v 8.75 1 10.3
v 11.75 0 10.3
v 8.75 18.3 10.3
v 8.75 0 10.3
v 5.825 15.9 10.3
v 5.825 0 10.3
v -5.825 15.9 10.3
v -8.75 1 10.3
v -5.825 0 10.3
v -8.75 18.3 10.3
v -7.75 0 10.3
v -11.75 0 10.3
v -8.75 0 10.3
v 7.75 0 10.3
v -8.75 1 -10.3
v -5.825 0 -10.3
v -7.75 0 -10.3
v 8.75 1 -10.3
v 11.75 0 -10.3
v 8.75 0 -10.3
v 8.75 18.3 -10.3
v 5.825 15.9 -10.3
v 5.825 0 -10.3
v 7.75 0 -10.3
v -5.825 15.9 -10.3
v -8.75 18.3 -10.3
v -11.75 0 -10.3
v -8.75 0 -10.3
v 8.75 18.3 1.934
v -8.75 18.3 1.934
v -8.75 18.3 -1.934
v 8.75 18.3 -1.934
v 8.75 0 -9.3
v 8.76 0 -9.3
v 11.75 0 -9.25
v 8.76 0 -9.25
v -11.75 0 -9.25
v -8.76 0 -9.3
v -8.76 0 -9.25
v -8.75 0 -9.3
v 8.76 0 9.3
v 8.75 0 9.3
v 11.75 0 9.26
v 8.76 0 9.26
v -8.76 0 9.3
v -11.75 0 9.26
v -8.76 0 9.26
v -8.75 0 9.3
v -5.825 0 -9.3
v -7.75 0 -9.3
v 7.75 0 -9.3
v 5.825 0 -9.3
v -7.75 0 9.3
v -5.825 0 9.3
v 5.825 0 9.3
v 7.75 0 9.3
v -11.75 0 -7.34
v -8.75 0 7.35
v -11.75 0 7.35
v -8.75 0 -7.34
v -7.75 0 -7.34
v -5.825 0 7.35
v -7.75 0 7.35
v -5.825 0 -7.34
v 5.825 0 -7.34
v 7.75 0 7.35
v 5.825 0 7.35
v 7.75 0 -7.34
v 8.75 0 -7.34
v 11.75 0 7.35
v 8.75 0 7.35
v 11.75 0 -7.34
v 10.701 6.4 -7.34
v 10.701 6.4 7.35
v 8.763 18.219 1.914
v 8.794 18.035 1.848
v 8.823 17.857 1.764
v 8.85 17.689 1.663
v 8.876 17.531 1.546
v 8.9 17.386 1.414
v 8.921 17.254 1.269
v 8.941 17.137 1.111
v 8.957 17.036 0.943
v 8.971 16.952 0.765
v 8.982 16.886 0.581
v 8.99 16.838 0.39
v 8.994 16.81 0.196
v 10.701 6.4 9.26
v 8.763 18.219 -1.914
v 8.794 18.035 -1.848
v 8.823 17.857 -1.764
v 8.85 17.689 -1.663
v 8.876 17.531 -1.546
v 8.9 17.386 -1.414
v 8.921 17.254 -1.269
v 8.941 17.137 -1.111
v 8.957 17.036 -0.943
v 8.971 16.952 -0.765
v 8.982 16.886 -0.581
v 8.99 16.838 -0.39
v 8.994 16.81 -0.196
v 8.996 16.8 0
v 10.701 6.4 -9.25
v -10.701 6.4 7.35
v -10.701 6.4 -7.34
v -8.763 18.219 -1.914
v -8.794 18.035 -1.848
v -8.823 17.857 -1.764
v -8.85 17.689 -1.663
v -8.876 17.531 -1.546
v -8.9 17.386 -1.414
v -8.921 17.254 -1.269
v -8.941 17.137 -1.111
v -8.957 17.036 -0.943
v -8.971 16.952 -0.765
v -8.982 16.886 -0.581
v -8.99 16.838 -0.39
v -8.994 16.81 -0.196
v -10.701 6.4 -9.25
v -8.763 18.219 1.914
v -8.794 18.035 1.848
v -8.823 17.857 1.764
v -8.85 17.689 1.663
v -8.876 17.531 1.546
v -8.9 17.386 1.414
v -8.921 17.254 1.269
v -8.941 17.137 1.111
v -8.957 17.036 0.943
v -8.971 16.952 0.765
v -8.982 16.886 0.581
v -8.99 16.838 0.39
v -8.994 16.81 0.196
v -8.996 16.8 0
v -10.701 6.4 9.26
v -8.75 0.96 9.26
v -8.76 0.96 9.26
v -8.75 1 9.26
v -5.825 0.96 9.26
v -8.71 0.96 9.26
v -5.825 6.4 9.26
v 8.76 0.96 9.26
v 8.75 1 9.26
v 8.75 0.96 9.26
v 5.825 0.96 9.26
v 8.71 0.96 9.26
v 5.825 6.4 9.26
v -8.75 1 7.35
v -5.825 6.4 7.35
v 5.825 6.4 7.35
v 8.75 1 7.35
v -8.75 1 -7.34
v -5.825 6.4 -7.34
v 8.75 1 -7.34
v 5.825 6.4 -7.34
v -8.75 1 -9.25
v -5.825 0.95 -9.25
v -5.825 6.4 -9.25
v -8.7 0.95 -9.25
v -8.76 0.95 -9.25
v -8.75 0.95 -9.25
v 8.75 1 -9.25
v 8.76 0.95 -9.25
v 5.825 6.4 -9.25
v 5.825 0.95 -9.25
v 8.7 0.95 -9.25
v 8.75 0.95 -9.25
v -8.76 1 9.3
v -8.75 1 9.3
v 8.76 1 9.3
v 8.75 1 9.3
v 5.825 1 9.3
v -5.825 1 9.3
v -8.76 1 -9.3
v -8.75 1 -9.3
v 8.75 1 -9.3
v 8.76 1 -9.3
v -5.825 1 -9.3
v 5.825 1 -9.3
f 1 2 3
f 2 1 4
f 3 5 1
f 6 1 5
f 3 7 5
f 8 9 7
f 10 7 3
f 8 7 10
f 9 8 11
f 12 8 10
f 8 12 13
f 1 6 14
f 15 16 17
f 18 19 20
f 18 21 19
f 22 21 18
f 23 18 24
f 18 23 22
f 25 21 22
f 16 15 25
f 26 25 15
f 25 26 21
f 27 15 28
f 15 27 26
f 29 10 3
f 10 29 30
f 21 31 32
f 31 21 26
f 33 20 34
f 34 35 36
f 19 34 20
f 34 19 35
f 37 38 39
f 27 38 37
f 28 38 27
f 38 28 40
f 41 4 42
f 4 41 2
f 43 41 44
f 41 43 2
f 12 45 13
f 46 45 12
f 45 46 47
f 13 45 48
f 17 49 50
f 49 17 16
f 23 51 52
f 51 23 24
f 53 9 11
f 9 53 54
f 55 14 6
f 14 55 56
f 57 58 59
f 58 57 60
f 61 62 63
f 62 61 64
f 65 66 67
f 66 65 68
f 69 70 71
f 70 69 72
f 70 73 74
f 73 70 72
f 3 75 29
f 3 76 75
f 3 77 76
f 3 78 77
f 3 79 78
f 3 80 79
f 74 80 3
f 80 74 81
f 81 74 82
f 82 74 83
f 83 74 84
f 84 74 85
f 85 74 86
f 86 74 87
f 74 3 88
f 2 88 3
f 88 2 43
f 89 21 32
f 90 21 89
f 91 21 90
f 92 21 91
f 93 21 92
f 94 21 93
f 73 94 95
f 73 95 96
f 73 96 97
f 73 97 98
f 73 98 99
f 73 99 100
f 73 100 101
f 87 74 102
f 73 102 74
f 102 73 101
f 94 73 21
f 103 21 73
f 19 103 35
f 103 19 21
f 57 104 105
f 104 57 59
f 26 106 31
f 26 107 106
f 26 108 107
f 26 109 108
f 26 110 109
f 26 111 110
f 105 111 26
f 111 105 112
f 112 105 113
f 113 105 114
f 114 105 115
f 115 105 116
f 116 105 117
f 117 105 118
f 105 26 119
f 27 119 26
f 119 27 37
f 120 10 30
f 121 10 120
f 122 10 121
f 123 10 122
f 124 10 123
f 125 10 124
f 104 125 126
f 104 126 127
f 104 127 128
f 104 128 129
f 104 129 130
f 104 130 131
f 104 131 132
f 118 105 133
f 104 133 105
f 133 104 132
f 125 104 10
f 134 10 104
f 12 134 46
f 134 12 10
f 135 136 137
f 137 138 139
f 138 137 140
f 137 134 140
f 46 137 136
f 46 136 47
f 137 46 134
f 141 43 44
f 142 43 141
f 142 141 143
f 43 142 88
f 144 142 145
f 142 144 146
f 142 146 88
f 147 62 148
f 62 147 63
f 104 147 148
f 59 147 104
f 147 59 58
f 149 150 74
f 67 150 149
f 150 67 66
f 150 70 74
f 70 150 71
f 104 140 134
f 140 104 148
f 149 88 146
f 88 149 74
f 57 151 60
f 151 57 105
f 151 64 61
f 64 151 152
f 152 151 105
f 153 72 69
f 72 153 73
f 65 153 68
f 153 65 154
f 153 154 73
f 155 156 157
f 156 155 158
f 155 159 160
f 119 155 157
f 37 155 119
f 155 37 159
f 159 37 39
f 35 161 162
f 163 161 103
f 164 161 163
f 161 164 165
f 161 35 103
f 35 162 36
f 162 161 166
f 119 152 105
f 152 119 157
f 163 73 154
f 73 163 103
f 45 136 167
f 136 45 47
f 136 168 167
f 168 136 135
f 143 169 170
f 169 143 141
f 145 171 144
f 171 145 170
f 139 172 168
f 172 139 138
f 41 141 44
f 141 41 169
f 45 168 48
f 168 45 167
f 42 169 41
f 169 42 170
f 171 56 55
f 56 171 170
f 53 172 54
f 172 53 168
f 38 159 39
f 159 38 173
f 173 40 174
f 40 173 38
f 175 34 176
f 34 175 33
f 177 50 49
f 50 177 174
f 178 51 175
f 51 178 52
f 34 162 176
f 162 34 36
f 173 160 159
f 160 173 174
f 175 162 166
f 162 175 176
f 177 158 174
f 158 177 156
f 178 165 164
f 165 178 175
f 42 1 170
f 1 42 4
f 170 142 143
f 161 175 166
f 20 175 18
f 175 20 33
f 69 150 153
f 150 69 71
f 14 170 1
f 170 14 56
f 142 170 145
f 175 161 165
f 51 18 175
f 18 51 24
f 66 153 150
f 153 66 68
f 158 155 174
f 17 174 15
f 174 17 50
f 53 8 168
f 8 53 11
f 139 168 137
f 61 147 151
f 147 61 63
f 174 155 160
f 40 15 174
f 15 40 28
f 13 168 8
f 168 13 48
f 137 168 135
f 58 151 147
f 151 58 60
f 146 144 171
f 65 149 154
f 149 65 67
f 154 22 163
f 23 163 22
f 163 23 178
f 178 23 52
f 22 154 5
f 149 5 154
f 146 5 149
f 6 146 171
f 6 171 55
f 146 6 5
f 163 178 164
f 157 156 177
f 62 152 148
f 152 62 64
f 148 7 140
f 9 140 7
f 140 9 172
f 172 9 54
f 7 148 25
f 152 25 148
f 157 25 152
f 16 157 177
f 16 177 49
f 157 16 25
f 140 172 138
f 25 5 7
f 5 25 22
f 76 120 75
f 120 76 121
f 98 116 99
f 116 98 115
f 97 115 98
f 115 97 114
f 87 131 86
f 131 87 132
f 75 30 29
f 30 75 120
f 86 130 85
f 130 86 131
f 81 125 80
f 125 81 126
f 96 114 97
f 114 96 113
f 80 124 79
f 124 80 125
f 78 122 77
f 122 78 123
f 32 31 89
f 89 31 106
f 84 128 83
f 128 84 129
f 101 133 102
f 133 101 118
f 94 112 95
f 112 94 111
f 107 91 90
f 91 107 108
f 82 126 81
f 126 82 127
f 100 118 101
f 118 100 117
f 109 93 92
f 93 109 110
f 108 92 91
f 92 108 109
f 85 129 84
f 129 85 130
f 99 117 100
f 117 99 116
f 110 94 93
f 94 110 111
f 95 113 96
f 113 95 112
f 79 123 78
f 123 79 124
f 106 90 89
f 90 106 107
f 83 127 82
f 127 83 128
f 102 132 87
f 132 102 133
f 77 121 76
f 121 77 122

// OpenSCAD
/*
  models/ham_radio/spooltenna_bnc_cap/spooltenna_bnc_cap.scad

  Parameterized BNC protective cap for the KO4HUI Spooltenna
  (Ultra v1.5/v1.6 primary, v1.3 stretch). Drops into the existing
  PCB slot at the bottom of the spool; held in place by the bongo tie.

  See docs/superpowers/specs/2026-05-12-spooltenna-bnc-cap-design.md
*/

$fn = 64;

// ---------------------------------------------------------------
// Model preset
// ---------------------------------------------------------------
//   "ULTRA_V1_6"  - Spooltenna Ultra v1.6 (default, identical to v1.5)
//   "ULTRA_V1_5"  - alias for ULTRA_V1_6
//   "V1_3"        - Spooltenna v1.3 (larger 120 mm disk)
model = "ULTRA_V1_6";

// ---------------------------------------------------------------
// Per-model geometry. Edit `model` above to switch presets.
// Override individual values below the preset block to customize.
// ---------------------------------------------------------------
preset_slot_width =
    (model == "V1_3")        ? 18.0  :
                               18.5;  // ULTRA_V1_5/V1_6

preset_slot_depth =
    (model == "V1_3")        ? 9.6   :
                               5.9;   // ULTRA_V1_5/V1_6

preset_disk_radius =
    (model == "V1_3")        ? 60.0  :
                               38.1;  // ULTRA_V1_5/V1_6

// All supported variants use the same horizontal Molex 73100 /
// Winconn 364A2x95 BNC family.
preset_bnc_protrusion =
    (model == "V1_3")        ? 5.0   :
                               8.5;

// ---------------------------------------------------------------
// Parameters (override per-print as needed)
// ---------------------------------------------------------------

// Stack
inter_pcb_gap   = 15.0;    // standoff length between the two PCBs
pcb_thickness   = 1.6;     // each PCB disk thickness
pcb_slot_clear  = 0.3;     // extra Z clearance for disk-edge slots
disk_outer_wall = 1.2;     // plastic outside each PCB edge slot

// Slot (resolved from preset)
slot_width      = preset_slot_width;
slot_depth      = preset_slot_depth;
disk_radius     = preset_disk_radius;

// BNC body (Molex 73100 / Winconn 364A2x95 family)
bnc_body_w      = 9.65;    // X (circumferential)
bnc_body_h      = 13.0;    // Z (axial height inside the inter-PCB gap)
bnc_protrusion  = preset_bnc_protrusion;

// Cap geometry
clearance       = 0.5;     // X per-side clearance to the slot
wall            = 2.4;     // front wall (radial-outermost)
side_wall       = 2.5;     // circumferential side walls
lead_in_chamfer = 1.0;     // chamfer on radially-inward edges
front_air_gap   = 1.5;     // BNC tip to inside of front wall
pocket_x_clear  = 1.0;     // each-side clearance around BNC body in X
disk_slot_depth = slot_depth + 0.5;
side_glance_w   = 3.0;     // side fairing width outside each leg

// Bongo tie groove
tie_groove_w    = 4.0;
tie_groove_d    = 1.5;

// ---------------------------------------------------------------
// Derived dimensions (do not edit; expressed for readability)
// ---------------------------------------------------------------

// Cap outer footprint (X = circumferential, Y = radial, Z = axial)
cap_x = slot_width - 2 * clearance;                         // 17.5 mm @ Ultra defaults
cap_z = inter_pcb_gap + 2 * (pcb_thickness + disk_outer_wall);  // 20.6 mm @ defaults
cap_y = slot_depth + bnc_protrusion + front_air_gap + wall;  // 18.3 mm @ Ultra defaults

// BNC pocket (interior cavity)
pocket_x = bnc_body_w + 2 * pocket_x_clear;  // 11.65 mm
pocket_y = cap_y - wall;                     // depth from inner face
pcb_slot_h = pcb_thickness + pcb_slot_clear;

// Sanity asserts (OpenSCAD will halt with these messages on bad params)
assert(cap_x > 0, "cap_x must be positive");
assert(cap_z > 0, "cap_z must be positive");
assert(cap_y > 0, "cap_y must be positive");
assert(pocket_x < cap_x - 2 * side_wall,
       "BNC pocket too wide for cap_x given side_wall");
assert(bnc_body_h < inter_pcb_gap,
       "BNC body too tall for inter_pcb_gap (axial)");
assert(pocket_y > slot_depth,
       "Pocket must reach past the slot into the body");

// ---------------------------------------------------------------
// Modules
// ---------------------------------------------------------------

// Solid outer block, before any cavities or chamfers.
// Centered: X on 0, Z on 0. Y=0 is the radially-inward (open) face.
module cap_solid() {
    translate([-cap_x / 2, 0, -cap_z / 2])
        cube([cap_x, cap_y, cap_z]);
}

// Side armor fairings on the outer faces of the two legs. In plan view
// these flare out at the disk side, then taper into the front wall so a
// side impact glances into the stronger body instead of the straight leg.
module side_glance_armor() {
    right_profile = [
        [cap_x / 2, 0],
        [cap_x / 2, cap_y],
        [cap_x / 2 + side_glance_w, 0]
    ];
    left_profile = [
        [-cap_x / 2, 0],
        [-cap_x / 2 - side_glance_w, 0],
        [-cap_x / 2, cap_y]
    ];

    translate([0, 0, -cap_z / 2])
        linear_extrude(height = cap_z) {
            polygon(right_profile);
            polygon(left_profile);
        }
}

module widened_x_cutout(y, z, depth, height) {
    eps = 0.01;

    translate([-cap_x / 2 - side_glance_w - eps, y, z])
        cube([cap_x + 2 * side_glance_w + 2 * eps, depth, height]);
}

// BNC pocket: a rectangular cavity that opens on the radially-inward
// face (Y = 0), extends Y forward to within `wall` of the front face,
// and cuts fully through Z so the PCB faces act as the axial walls.
// Centered on X.
module bnc_pocket() {
    eps = 0.01;  // overlap into the open face so the boolean is clean
    translate([-pocket_x / 2, -eps, -cap_z / 2 - eps])
        cube([pocket_x, pocket_y + eps, cap_z + 2 * eps]);
}

// Bongo tie groove: circular-segment channel across the front Y face,
// running across X from prong to prong.
module tie_groove() {
    eps = 0.01;
    r = tie_groove_w / 2;
    translate([-cap_x / 2 - side_glance_w - eps,
               cap_y + r - tie_groove_d,
               0])
        rotate([0, 90, 0])
            cylinder(r = r, h = cap_x + 2 * side_glance_w + 2 * eps);
}

// Slots that let the two PCB disk edges slide into the side legs. These
// are what locate the cap axially while the bongo tie holds it inward.
module pcb_edge_slots() {
    eps = 0.01;
    y_depth = disk_slot_depth + eps;

    widened_x_cutout(-eps,
                     inter_pcb_gap / 2 - pcb_slot_clear / 2,
                     y_depth,
                     pcb_slot_h + eps);

    widened_x_cutout(-eps,
                     -inter_pcb_gap / 2 - pcb_thickness - pcb_slot_clear / 2,
                     y_depth,
                     pcb_slot_h + eps);
}

// One triangular-prism cutter: a c x c right triangle extruded along its
// own +X axis for `length` mm. The hypotenuse is the chamfer surface.
module _chamfer_prism(length, c) {
    rotate([0, 90, 0])
        linear_extrude(height = length)
            polygon([[0, 0], [c, 0], [0, c]]);
}

// Triangular-prism cutter extruded along +Z for the vertical mouth edges.
module _right_edge_chamfer_prism(length, c) {
    linear_extrude(height = length)
        polygon([[0, 0], [-c, 0], [0, c]]);
}

module _left_edge_chamfer_prism(length, c) {
    linear_extrude(height = length)
        polygon([[0, 0], [c, 0], [0, c]]);
}

// Lead-in chamfer on the four edges of the radially-inward (Y=0) face.
module lead_in_chamfers() {
    c = lead_in_chamfer;
    eps = 0.01;
    L_x = cap_x + 2 * eps;
    L_z = cap_z + 2 * eps;

    // Y=0 / +Z edge (top of mouth, runs along +X)
    translate([-cap_x / 2 - eps, 0, cap_z / 2 - c])
        _chamfer_prism(L_x, c);

    // Y=0 / -Z edge (bottom of mouth, runs along +X)
    translate([-cap_x / 2 - eps, 0, -cap_z / 2])
        mirror([0, 0, 1])
            translate([0, 0, -c])
                _chamfer_prism(L_x, c);

    // Y=0 / +X edge (right side of mouth, runs along +Z)
    translate([cap_x / 2, 0, -cap_z / 2 - eps])
        _right_edge_chamfer_prism(L_z, c);

    // Y=0 / -X edge (left side of mouth, runs along +Z)
    translate([-cap_x / 2, 0, -cap_z / 2 - eps])
        _left_edge_chamfer_prism(L_z, c);
}

// ---------------------------------------------------------------
// Top-level cap
// ---------------------------------------------------------------
module cap() {
    difference() {
        union() {
            cap_solid();
            side_glance_armor();
        }
        bnc_pocket();
        pcb_edge_slots();
        tie_groove();
        lead_in_chamfers();
    }
}

cap();
